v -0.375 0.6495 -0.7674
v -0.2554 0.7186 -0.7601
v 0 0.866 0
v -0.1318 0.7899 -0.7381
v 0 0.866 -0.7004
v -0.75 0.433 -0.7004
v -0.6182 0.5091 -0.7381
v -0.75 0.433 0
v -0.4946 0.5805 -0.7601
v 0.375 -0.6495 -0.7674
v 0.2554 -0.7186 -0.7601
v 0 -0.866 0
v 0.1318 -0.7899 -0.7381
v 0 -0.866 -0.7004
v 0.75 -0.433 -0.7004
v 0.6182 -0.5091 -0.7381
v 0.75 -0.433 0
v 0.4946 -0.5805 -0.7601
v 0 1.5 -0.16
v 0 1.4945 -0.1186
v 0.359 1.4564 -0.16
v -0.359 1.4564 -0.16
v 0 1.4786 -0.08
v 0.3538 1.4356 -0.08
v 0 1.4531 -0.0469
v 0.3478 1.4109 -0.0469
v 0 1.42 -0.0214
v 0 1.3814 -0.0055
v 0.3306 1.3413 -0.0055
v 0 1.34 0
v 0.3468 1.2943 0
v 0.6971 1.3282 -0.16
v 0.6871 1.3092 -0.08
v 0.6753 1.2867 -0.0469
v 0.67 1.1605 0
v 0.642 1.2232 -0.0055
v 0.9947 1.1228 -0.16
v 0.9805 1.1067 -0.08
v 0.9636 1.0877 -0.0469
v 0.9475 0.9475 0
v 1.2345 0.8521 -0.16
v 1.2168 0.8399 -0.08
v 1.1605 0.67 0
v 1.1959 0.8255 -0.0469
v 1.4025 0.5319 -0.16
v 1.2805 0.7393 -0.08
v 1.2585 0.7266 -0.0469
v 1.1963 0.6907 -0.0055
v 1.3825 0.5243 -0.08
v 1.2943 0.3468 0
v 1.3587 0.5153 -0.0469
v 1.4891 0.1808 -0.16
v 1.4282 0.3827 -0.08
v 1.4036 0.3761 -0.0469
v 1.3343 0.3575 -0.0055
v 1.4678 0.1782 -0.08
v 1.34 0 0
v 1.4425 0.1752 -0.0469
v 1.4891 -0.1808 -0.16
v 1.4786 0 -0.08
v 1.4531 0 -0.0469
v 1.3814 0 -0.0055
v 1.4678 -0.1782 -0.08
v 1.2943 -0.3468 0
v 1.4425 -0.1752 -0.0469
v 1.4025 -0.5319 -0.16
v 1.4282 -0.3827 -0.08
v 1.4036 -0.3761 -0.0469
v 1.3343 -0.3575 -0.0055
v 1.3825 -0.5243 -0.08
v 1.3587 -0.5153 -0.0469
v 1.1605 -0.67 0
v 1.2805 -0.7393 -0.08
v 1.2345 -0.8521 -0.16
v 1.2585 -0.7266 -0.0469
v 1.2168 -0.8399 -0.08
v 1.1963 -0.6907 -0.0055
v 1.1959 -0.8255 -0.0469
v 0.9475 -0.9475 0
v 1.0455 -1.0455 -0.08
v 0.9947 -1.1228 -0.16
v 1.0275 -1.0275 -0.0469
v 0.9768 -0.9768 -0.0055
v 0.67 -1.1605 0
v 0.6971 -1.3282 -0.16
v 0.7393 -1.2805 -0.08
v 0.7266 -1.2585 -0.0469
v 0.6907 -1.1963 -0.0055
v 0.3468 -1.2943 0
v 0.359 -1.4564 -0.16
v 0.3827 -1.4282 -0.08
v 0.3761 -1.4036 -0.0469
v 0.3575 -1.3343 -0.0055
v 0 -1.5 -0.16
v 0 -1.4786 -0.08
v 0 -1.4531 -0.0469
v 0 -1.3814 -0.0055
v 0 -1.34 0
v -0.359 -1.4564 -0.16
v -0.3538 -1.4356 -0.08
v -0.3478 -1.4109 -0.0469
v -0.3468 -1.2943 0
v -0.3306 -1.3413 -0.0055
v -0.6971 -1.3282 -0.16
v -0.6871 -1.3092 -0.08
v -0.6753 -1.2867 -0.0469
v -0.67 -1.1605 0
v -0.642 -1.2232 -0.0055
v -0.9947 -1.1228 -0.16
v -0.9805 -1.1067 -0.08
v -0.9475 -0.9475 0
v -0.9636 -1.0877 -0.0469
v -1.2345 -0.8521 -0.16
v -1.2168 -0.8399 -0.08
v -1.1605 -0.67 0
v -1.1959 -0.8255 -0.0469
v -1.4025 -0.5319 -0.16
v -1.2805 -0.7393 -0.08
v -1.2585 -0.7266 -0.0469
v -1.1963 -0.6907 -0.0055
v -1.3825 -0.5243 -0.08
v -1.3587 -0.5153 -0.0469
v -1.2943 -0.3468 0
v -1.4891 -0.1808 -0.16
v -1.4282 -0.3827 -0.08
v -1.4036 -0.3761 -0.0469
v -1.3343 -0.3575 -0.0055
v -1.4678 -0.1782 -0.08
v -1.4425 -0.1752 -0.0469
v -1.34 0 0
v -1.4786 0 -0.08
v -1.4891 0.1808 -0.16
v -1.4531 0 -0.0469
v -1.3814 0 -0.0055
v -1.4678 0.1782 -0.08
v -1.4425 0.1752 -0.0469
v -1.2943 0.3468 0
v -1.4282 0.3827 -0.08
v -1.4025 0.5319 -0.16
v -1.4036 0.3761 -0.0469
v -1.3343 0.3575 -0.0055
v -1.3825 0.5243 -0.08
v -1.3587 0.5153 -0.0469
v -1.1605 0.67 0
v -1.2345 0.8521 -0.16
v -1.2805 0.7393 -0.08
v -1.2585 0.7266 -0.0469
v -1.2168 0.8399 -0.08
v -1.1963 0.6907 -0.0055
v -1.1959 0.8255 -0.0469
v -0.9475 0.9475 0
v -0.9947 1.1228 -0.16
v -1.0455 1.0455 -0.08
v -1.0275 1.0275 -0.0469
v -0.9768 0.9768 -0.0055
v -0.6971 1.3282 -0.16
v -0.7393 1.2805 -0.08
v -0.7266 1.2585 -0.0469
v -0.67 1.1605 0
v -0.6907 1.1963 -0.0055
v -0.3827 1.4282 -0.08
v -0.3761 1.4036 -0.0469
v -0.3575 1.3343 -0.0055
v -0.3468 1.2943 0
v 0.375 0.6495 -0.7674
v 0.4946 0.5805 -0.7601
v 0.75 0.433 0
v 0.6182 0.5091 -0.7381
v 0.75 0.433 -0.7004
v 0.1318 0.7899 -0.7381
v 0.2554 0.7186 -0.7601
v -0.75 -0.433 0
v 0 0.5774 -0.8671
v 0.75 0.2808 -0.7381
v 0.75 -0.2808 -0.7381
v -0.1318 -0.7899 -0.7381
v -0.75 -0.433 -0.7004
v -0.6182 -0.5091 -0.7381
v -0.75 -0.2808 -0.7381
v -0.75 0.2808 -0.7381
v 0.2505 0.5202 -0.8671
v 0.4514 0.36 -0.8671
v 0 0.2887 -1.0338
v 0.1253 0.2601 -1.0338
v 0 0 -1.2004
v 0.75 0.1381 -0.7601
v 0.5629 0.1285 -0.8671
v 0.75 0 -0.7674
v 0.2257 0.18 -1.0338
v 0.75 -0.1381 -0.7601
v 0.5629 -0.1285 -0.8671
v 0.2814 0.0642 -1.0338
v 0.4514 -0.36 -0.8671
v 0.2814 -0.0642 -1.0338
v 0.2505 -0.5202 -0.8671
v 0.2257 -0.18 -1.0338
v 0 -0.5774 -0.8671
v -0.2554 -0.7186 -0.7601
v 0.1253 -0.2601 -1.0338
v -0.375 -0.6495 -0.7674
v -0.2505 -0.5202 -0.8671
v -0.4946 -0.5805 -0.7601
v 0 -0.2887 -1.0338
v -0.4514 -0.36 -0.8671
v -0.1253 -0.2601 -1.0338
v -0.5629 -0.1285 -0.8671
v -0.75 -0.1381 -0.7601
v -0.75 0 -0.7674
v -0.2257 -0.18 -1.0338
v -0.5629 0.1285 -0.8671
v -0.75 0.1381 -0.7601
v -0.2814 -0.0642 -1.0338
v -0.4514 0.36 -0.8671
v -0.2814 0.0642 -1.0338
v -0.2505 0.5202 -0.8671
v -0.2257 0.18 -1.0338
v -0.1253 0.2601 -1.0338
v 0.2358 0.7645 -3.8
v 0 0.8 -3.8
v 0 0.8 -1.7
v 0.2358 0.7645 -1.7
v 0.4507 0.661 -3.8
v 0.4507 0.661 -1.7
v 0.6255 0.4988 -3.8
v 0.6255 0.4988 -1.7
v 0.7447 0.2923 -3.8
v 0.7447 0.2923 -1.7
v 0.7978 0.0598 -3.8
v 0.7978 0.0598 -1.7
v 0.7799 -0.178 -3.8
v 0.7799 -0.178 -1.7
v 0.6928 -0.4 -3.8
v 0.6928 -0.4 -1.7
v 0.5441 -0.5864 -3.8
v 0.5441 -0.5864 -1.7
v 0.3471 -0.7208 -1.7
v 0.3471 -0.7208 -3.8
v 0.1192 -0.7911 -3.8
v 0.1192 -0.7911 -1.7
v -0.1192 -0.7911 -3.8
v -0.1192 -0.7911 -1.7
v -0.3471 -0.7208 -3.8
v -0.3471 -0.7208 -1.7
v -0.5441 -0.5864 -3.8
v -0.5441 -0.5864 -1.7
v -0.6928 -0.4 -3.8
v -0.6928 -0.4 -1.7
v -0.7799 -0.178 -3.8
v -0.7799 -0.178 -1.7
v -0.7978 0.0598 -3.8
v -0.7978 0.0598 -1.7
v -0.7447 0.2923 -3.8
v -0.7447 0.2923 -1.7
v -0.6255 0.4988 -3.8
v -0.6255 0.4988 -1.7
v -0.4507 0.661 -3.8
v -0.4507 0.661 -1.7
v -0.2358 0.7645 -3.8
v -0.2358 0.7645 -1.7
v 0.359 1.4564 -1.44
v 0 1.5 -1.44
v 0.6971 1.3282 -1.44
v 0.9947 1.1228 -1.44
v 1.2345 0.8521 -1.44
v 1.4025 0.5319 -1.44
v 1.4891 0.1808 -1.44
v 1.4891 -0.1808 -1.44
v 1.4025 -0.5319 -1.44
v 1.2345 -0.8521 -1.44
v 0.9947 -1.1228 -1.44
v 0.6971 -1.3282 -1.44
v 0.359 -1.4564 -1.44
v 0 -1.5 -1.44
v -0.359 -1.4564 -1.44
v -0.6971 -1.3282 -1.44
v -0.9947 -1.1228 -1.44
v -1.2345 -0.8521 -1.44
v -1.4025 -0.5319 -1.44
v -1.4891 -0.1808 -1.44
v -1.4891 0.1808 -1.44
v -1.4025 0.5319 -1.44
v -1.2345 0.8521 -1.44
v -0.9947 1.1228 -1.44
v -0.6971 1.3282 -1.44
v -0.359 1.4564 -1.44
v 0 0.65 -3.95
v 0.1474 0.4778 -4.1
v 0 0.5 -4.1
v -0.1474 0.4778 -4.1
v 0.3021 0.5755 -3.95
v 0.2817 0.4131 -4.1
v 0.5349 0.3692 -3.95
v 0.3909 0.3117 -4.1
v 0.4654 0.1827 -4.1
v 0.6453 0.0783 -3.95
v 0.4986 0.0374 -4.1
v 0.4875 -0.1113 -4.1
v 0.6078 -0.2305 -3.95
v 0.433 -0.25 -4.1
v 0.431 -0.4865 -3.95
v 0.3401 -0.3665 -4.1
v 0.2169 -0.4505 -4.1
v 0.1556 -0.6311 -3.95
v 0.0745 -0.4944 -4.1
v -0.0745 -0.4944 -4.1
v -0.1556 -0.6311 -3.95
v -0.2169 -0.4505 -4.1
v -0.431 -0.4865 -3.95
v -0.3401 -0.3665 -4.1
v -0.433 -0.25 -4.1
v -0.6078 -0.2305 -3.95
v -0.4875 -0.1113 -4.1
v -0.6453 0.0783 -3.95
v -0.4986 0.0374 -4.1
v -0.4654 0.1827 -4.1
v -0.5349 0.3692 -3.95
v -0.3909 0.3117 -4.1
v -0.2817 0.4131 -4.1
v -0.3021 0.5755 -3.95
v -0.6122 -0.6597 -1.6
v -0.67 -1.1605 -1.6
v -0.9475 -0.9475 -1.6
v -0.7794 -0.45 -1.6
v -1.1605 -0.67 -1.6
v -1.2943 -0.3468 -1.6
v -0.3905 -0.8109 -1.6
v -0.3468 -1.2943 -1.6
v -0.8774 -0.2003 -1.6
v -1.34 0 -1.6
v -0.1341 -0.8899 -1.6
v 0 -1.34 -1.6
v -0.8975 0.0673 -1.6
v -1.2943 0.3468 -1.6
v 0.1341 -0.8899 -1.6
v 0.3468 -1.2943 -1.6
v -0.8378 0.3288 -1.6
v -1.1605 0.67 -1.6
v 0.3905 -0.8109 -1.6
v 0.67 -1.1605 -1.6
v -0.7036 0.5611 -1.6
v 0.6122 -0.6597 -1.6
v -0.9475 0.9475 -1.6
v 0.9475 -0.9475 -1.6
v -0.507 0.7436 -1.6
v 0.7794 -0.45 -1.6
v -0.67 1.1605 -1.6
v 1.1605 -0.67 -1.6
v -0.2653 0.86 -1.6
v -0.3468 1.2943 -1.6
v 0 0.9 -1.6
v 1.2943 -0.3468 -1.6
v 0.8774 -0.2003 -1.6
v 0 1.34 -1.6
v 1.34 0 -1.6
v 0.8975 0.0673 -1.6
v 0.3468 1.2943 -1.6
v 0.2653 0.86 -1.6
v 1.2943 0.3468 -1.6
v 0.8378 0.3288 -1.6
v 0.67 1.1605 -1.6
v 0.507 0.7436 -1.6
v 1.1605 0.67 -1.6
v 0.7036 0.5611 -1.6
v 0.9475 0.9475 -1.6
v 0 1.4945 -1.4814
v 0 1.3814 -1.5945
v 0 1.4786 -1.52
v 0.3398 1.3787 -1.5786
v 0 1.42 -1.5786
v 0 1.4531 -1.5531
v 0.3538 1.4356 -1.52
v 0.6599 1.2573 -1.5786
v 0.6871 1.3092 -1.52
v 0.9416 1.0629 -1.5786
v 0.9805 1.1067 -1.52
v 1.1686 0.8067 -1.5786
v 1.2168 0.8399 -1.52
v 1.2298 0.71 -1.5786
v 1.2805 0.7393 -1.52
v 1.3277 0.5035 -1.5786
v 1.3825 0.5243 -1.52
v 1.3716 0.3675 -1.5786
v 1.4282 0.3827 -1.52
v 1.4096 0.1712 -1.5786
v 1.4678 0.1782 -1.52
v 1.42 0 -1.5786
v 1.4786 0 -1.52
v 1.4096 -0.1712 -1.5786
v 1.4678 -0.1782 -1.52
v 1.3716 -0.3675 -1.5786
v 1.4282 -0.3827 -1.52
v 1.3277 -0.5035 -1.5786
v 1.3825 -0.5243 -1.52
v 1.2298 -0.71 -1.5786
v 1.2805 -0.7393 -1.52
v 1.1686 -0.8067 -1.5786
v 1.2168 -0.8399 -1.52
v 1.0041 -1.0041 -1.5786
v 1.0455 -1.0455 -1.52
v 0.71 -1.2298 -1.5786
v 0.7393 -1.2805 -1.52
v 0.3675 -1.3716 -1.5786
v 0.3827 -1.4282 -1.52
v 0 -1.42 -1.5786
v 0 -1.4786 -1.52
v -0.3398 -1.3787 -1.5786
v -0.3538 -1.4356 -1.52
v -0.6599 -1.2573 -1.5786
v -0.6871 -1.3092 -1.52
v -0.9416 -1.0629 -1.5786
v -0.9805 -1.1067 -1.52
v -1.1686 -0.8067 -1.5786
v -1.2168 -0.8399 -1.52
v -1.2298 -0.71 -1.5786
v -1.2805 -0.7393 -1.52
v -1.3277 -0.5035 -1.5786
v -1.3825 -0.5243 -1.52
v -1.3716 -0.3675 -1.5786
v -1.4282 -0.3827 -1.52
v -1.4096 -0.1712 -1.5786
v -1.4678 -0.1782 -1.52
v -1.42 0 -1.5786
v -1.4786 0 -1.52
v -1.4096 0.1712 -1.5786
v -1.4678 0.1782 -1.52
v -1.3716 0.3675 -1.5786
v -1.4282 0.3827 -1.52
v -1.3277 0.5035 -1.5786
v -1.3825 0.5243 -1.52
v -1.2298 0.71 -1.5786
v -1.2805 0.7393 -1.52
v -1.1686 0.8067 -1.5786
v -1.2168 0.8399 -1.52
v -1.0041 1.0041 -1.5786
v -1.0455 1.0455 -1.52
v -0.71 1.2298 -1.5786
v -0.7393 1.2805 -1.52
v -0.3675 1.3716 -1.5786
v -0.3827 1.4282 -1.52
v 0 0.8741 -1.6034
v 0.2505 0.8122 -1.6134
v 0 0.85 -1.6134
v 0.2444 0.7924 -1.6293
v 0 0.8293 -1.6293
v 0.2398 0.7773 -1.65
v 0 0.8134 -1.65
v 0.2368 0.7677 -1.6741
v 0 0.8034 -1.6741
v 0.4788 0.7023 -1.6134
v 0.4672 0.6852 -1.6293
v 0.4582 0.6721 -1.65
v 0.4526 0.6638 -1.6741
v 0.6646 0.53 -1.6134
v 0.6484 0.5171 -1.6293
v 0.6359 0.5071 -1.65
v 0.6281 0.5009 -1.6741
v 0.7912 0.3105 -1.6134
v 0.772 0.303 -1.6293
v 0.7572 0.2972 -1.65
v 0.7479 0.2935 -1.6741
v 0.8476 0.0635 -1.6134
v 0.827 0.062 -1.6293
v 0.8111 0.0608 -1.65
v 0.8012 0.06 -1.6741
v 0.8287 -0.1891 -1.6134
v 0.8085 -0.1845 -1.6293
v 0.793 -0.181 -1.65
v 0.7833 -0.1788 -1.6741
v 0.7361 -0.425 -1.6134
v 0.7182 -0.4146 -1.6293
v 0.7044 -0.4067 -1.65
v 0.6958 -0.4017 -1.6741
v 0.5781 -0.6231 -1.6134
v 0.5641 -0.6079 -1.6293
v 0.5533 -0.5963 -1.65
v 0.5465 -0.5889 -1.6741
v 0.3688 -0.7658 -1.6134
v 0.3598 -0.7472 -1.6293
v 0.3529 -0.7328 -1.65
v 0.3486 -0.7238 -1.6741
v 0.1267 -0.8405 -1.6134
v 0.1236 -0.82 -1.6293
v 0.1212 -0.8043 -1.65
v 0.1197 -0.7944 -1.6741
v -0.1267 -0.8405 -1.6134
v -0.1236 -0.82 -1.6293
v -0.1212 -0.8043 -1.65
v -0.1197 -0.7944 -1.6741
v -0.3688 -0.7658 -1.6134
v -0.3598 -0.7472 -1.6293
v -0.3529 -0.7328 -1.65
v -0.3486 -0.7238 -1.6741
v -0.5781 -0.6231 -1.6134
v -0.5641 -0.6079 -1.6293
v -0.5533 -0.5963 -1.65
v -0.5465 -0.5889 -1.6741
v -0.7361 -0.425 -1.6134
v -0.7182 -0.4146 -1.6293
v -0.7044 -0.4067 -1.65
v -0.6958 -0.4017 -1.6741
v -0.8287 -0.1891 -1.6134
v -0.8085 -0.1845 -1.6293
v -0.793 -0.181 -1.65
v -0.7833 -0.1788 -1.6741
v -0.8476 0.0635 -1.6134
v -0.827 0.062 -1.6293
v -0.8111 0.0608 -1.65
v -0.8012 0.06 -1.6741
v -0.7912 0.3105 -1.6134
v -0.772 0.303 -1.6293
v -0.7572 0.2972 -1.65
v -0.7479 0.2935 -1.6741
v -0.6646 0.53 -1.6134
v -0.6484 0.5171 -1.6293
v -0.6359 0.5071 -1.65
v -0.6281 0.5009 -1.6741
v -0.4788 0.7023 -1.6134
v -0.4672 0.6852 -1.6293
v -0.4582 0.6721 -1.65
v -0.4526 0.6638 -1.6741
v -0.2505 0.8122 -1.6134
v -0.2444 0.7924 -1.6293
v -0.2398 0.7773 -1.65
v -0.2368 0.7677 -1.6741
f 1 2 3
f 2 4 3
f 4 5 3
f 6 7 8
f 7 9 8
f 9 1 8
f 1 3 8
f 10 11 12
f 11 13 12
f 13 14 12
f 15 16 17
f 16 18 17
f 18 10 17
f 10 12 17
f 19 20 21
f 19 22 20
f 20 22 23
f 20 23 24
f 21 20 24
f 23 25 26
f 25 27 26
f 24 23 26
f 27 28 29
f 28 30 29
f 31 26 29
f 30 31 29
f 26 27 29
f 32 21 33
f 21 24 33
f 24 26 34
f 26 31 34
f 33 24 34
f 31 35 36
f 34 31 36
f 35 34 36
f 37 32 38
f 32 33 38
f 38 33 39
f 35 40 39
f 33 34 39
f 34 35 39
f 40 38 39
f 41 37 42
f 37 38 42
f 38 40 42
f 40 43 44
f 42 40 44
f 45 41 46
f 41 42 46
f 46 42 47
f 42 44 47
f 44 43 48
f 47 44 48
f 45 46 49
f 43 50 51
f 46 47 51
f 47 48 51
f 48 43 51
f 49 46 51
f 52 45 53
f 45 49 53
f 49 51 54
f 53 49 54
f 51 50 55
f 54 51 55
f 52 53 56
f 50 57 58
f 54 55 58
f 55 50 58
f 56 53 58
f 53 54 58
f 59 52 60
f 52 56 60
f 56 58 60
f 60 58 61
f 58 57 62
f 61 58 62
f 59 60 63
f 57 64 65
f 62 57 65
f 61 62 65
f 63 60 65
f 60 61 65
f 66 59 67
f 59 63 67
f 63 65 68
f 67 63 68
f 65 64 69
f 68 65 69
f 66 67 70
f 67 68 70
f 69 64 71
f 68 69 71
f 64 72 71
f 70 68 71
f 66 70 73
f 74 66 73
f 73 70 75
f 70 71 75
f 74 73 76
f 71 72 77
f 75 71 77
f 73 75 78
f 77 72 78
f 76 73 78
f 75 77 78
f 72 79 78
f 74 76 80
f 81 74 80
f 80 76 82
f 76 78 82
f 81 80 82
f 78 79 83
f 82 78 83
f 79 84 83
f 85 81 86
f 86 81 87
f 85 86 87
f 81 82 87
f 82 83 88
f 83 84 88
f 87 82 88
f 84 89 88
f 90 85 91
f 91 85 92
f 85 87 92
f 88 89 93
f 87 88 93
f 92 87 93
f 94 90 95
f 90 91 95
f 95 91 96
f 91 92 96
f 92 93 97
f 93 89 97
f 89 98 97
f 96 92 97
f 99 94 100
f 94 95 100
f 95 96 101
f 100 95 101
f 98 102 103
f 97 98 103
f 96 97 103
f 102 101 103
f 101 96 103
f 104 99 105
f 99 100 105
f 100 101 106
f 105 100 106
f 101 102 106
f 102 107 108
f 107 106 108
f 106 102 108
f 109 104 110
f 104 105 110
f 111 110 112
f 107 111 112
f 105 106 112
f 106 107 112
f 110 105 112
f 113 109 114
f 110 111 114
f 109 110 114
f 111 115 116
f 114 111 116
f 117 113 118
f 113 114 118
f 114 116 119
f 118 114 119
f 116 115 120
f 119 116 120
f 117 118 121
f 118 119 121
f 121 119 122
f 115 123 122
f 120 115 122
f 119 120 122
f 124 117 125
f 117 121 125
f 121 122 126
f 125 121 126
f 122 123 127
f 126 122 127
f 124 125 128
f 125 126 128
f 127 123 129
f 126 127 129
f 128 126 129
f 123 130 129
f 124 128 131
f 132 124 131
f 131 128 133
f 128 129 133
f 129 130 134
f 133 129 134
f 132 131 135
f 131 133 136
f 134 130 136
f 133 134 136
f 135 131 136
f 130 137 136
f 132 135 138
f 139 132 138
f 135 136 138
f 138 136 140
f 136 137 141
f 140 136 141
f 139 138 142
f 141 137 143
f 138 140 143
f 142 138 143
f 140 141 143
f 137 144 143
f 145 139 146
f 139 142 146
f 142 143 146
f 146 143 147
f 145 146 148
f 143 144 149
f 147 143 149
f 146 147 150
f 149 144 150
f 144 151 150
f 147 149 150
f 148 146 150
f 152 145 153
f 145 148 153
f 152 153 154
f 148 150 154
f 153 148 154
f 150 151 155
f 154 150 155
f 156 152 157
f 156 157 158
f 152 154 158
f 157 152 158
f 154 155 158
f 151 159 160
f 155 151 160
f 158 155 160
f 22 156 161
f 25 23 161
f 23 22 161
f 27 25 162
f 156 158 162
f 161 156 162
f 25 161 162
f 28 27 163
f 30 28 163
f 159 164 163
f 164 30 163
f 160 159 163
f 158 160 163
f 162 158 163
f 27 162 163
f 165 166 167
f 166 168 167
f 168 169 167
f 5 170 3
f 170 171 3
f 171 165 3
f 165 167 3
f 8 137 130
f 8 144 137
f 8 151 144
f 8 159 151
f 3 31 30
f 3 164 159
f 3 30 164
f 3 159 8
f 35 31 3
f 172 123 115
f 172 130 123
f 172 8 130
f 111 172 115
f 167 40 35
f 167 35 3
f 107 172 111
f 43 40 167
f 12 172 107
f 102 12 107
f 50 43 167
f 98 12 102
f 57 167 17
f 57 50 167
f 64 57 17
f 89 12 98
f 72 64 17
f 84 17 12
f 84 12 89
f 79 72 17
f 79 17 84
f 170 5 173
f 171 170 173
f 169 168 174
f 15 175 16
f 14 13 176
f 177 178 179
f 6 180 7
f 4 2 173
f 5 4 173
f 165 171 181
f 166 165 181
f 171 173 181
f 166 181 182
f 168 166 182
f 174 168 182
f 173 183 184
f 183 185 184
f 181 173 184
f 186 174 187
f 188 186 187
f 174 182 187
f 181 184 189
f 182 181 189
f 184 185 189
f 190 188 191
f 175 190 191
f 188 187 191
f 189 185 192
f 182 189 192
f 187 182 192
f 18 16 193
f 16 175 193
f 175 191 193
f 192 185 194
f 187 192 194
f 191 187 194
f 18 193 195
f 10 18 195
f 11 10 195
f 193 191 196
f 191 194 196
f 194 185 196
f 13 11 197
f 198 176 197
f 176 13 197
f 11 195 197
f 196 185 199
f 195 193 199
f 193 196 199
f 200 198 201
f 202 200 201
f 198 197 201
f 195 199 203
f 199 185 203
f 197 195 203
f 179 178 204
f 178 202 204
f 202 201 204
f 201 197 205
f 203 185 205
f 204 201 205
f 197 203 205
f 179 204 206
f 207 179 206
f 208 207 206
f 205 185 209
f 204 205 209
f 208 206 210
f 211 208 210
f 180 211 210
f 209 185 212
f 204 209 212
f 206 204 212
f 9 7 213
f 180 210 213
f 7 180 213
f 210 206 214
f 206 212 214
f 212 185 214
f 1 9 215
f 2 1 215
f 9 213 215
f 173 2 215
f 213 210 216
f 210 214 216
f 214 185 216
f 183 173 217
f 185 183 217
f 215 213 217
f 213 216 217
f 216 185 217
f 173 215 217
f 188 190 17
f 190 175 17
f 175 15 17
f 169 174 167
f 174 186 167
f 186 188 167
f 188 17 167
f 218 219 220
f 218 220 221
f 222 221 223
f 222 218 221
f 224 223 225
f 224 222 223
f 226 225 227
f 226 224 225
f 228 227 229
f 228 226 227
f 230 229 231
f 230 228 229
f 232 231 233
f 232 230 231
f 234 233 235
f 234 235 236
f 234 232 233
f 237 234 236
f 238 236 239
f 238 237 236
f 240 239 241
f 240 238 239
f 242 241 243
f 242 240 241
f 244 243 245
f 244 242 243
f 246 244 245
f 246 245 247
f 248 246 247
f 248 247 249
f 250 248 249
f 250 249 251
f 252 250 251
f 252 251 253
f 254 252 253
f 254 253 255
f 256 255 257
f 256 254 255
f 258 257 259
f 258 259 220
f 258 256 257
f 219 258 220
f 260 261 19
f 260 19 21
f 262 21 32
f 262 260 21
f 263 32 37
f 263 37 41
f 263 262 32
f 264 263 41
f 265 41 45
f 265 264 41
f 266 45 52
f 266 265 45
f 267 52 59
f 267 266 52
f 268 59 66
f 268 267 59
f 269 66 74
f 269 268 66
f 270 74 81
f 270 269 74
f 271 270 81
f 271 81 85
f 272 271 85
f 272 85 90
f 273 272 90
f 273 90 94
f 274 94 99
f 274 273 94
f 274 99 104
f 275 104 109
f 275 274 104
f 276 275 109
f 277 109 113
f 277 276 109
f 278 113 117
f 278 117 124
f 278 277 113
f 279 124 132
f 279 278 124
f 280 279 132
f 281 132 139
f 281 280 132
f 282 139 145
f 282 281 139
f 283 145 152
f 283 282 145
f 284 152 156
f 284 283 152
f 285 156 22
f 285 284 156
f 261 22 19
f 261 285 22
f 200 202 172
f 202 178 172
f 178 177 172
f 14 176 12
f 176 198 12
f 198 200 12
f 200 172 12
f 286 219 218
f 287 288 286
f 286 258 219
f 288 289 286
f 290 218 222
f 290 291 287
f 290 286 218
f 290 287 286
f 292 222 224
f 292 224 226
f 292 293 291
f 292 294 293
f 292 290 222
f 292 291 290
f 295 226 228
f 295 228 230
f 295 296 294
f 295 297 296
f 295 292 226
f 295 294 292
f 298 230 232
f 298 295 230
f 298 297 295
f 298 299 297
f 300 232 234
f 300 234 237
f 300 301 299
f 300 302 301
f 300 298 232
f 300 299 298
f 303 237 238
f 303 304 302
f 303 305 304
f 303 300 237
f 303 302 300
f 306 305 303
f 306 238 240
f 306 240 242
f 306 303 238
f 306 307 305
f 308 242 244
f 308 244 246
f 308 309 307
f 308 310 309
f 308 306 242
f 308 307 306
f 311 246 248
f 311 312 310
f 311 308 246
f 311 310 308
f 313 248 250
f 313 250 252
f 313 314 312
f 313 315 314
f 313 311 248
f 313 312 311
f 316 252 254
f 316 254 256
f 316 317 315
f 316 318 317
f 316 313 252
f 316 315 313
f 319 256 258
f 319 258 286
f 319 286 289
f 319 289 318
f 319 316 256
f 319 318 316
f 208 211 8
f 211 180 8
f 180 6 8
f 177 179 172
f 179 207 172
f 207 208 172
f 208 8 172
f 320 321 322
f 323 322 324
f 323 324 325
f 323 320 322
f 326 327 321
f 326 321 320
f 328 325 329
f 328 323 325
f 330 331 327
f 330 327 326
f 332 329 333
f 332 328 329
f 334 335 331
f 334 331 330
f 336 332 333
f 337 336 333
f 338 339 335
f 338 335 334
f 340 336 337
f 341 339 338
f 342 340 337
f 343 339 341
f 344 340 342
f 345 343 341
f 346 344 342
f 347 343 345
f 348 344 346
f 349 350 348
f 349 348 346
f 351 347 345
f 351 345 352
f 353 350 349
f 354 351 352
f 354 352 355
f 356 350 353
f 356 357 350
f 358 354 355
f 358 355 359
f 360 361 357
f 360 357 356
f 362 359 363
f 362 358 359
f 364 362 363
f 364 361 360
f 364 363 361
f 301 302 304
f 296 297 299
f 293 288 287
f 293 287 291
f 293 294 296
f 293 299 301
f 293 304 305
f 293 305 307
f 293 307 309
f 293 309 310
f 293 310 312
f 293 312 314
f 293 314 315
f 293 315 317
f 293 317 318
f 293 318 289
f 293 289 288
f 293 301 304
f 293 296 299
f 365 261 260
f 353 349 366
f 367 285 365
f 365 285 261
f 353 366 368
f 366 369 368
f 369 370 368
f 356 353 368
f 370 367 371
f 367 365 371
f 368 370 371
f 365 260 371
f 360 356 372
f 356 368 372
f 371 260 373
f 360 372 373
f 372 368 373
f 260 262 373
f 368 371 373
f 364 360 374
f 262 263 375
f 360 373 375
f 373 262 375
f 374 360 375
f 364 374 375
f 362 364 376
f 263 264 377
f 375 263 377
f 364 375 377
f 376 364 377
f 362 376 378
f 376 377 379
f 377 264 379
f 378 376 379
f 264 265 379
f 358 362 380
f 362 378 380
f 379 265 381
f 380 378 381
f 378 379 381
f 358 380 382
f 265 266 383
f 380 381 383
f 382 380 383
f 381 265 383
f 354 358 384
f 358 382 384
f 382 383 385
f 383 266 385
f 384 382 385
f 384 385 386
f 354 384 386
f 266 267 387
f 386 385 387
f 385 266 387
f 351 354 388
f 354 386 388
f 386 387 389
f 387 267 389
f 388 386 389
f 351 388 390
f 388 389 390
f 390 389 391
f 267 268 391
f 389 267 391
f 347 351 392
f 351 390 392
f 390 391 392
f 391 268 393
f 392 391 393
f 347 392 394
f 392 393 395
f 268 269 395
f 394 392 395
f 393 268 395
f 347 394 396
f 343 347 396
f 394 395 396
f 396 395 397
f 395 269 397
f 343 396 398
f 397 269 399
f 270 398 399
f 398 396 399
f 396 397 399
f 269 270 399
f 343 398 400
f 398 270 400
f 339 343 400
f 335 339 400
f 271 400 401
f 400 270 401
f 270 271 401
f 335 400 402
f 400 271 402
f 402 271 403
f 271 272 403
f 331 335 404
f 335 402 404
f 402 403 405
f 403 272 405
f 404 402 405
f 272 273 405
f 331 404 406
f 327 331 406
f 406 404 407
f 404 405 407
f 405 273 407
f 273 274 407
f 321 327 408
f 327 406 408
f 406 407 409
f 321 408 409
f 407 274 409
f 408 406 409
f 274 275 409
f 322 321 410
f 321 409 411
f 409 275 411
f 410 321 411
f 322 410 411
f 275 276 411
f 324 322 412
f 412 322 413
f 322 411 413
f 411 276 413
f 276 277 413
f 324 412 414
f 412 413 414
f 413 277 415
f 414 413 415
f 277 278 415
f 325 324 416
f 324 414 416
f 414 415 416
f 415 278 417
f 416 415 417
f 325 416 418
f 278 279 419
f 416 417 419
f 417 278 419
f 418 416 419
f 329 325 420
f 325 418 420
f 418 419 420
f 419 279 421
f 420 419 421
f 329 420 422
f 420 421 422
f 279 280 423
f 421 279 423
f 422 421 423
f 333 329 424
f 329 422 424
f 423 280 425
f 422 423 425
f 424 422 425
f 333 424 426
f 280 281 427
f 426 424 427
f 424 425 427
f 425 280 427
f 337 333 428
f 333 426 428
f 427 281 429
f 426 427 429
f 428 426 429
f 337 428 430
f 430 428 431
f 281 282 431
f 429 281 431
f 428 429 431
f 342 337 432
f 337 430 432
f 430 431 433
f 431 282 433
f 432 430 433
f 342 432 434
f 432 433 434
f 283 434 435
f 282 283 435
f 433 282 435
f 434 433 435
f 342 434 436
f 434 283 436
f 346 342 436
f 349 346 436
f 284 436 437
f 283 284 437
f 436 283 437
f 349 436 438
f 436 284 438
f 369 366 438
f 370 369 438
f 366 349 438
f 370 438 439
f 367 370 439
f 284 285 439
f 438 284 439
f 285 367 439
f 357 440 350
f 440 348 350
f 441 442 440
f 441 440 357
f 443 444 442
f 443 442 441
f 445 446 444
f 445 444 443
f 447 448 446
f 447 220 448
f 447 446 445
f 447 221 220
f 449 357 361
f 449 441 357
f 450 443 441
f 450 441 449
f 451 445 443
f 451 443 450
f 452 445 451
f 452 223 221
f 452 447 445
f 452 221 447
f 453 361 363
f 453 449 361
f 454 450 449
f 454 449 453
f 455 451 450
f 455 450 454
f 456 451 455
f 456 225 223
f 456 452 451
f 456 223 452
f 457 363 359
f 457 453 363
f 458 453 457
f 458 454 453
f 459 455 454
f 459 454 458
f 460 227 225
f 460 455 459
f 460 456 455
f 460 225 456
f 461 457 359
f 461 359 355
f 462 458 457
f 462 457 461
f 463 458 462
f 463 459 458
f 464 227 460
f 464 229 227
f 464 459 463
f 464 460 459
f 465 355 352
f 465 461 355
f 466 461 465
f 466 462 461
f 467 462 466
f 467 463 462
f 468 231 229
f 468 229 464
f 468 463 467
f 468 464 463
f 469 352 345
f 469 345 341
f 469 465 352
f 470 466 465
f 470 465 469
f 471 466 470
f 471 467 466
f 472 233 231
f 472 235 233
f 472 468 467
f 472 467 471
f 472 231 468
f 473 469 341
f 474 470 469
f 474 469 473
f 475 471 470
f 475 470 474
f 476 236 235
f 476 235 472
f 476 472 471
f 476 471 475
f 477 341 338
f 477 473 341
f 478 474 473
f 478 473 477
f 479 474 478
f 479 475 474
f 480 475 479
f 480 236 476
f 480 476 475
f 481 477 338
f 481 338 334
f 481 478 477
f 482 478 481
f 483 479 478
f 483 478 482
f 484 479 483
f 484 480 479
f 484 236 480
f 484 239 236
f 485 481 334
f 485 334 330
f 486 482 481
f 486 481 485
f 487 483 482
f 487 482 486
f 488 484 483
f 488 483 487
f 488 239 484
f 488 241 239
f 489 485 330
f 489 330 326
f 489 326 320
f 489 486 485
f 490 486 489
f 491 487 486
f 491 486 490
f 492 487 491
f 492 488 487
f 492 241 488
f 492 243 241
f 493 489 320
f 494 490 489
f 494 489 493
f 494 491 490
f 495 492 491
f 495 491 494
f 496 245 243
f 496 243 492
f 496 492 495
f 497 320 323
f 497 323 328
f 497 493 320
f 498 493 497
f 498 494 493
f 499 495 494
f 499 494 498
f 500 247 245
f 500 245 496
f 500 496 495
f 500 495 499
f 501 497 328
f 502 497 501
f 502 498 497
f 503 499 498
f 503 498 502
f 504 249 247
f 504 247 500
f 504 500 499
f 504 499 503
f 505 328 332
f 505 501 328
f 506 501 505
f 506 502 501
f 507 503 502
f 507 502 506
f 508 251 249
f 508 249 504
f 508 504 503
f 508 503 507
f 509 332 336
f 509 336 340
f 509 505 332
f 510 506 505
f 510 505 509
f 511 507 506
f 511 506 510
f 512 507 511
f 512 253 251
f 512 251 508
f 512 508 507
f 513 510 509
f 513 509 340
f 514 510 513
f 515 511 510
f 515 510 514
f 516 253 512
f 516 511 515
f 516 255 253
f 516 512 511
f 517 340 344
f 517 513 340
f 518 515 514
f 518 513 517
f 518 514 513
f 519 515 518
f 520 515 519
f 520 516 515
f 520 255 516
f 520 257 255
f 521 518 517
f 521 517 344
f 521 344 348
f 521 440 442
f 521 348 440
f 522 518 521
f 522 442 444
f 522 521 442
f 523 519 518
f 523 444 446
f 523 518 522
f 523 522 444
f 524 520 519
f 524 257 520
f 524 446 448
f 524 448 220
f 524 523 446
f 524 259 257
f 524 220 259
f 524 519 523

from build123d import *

# Parameters (mm, degrees)
CHAMFERROD_SIZE = 0.3
FILLETHEAD_R    = 0.16
HEXHEAD_DEPTH   = 0.7
HEXHEAD2_DEPTH  = 0.55463
FILLET1_R       = 0.1


with BuildPart() as part:
    # Sketch1 → RevolveBase (revolve)
    with BuildSketch(Plane(origin=(0, 0, 0), x_dir=(0, 0, -1), z_dir=(1, 0, 0))):
        Polygon((0, 0), (0, 1.5), (1.6, 1.5), (1.6, 0.8), (4.1, 0.8), (4.1, 0), align=None)
    revolve(axis=Axis((0, 0, 0), (0, 0, -1)))

    # ChamferRod
    chamferrod_edges = [part.edges().sort_by_distance(p)[0] for p in [
        (0, -0.8, -4.1),
    ]]
    chamfer(chamferrod_edges, length=CHAMFERROD_SIZE)

    # FilletHead
    fillethead_edges = [part.edges().sort_by_distance(p)[0] for p in [
        (0, -1.5, -1.6),
        (0, -1.5, 0),
    ]]
    fillet(fillethead_edges, radius=FILLETHEAD_R)

    # Sketch2 → HexHead (cut)
    with BuildSketch(Plane.XY):
        Polygon((0, 0.866025404), (-0.75, 0.433012702), (-0.75, -0.433012702), (0, -0.866025404), (0.75, -0.433012702), (0.75, 0.433012702), align=None)
    extrude(amount=-HEXHEAD_DEPTH, mode=Mode.SUBTRACT)

    # Sketch3 → HexHead2 (cut)
    with BuildSketch(Plane.XY.offset(-0.7)):
        Polygon((0, 0.866025404), (-0.75, 0.433012702), (-0.75, -0.433012702), (0, -0.866025404), (0.75, -0.433012702), (0.75, 0.433012702), align=None)
    extrude(amount=-HEXHEAD2_DEPTH, mode=Mode.SUBTRACT)

    # Sketch4 → RevolveHexHead (revolve)
    with BuildSketch(Plane(origin=(0, 0, 0), x_dir=(0, 0, -1), z_dir=(1, 0, 0))):
        Polygon((1.20043278, 0), (1.254629995, 0), (1.254629995, 0.866775), (0.7, 0.866775), align=None)
    revolve(axis=Axis((0, 0, 0), (0, 0, -1)))

    # Fillet1
    fillet1_edges = [part.edges().sort_by_distance(p)[0] for p in [
        (0, -0.8, -1.6),
    ]]
    fillet(fillet1_edges, radius=FILLET1_R)


solid = part.part
